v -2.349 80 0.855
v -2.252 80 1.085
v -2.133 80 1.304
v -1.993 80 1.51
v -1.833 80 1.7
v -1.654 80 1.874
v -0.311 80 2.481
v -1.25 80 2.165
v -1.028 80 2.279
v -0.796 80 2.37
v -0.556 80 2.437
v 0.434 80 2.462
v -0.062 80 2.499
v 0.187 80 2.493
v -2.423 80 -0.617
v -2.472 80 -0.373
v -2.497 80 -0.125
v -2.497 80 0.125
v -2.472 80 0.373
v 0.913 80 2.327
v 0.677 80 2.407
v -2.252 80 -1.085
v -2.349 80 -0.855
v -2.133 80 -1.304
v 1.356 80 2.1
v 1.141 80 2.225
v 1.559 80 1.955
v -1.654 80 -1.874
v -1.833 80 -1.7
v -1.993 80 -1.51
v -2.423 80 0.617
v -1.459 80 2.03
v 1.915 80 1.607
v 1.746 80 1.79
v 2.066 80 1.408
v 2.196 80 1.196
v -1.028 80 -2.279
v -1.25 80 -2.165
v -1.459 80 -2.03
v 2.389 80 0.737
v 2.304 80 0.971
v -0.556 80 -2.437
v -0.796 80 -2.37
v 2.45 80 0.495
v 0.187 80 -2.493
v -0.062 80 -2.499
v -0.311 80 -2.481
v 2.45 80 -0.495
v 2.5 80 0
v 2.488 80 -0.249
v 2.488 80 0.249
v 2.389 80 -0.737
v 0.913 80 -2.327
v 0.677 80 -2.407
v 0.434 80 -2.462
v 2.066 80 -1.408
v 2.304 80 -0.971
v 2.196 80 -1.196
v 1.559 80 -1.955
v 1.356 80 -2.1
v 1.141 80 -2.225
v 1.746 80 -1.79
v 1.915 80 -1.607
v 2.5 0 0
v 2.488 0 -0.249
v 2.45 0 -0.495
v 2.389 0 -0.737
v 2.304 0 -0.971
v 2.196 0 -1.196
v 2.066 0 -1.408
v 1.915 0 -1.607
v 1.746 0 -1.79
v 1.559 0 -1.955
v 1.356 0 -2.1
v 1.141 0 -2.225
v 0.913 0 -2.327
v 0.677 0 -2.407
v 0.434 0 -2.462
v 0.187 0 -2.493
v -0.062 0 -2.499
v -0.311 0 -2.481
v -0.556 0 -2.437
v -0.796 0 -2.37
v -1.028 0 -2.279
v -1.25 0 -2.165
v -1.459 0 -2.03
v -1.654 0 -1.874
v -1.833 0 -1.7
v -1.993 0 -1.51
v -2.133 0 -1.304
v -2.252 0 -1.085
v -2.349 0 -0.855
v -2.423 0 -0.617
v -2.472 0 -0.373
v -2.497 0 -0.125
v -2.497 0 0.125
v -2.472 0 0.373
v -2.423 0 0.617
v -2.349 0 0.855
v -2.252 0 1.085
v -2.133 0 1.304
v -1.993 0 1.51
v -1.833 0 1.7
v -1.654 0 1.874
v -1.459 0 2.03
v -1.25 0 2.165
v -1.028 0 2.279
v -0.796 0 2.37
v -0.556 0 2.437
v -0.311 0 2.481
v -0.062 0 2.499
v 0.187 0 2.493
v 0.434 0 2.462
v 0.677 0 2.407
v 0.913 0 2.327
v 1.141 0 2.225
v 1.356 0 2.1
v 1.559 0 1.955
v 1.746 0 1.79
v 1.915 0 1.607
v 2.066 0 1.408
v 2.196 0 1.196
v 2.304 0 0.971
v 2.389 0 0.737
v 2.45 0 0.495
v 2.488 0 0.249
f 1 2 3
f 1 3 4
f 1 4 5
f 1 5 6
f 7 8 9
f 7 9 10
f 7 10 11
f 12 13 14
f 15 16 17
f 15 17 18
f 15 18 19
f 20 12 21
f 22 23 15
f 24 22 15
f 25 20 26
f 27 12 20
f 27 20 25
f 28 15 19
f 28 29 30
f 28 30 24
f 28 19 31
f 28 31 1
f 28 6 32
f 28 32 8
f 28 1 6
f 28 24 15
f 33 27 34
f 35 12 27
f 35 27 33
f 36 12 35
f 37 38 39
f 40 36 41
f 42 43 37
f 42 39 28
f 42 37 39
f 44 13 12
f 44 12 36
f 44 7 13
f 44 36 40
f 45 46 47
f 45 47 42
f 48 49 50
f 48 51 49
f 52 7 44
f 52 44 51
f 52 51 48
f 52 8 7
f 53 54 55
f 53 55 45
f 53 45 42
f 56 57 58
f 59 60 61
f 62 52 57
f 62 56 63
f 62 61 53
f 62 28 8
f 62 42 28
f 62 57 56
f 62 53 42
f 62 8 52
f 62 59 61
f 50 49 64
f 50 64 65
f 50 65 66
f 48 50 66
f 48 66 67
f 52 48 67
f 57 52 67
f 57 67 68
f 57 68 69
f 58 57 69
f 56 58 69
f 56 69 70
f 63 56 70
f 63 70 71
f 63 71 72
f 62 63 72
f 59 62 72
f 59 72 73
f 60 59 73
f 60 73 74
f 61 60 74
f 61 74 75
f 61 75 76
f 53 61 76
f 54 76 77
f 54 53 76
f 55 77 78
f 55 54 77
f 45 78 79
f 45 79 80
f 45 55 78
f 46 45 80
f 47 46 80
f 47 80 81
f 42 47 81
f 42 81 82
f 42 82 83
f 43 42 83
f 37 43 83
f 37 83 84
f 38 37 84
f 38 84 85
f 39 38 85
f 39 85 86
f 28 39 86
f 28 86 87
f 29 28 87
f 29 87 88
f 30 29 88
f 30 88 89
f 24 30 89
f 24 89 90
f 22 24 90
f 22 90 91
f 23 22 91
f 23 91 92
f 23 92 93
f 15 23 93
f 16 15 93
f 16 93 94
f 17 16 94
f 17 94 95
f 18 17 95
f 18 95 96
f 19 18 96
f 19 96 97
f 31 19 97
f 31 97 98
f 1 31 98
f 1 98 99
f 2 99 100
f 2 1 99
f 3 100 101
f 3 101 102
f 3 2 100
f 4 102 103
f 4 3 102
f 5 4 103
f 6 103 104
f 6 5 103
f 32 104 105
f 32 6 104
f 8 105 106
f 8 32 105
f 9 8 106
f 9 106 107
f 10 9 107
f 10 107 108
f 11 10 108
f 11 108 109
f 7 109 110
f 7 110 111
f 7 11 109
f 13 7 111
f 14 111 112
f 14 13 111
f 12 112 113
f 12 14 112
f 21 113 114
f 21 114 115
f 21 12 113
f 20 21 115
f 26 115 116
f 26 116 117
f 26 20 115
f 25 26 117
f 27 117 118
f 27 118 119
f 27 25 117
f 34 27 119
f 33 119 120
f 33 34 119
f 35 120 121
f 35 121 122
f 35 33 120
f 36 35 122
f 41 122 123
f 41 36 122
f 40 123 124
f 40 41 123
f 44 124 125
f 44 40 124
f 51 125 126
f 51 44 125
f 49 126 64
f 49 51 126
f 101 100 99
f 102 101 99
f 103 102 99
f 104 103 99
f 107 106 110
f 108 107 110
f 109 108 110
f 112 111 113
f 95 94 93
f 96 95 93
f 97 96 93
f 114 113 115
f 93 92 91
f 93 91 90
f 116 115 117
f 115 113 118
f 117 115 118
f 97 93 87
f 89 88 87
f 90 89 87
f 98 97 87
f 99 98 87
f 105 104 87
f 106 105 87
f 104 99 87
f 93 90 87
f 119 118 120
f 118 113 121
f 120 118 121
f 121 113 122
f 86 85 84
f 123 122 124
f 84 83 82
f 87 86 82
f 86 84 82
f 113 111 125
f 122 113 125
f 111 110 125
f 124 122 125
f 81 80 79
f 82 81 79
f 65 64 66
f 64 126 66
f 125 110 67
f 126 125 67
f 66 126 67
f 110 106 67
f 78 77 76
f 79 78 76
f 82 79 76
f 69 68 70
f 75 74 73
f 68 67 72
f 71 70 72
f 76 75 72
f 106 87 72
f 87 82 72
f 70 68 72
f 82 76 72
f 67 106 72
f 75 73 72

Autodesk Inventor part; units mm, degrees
ref_plane "YZ Plane" through (0, 0, 0) normal (1, 0, 0) x (0, 1, 0)
ref_plane "XZ Plane" through (0, 0, 0) normal (0, 1, 0) x (-1, 0, 0)
ref_plane "XY Plane" through (0, 0, 0) normal (0, 0, 1) x (1, 0, 0)
sketch "Sketch1" plane through (0, 0, 0) normal (0, 1, 0) x (-1, 0, 0)
  circle A0 centre (0, 0) radius 5
  dimension "d0" = 10
extrude "Extrusion1" add sketch "Sketch1" along normal blind 80
sketch "Sketch2" plane through (0, 0, 0) normal (0, 0, 1) x (1, 0, 0)
  circle A0 centre (0, 20) radius 1
  point P0 (0, 0)
  dimension "d3" = 2
extrude "Extrusion2" add sketch "Sketch2" against normal mid plane 10
sketch "Sketch3" plane through (0, 80, 0) normal (0, 1, 0) x (1, 0, 0)
  circle A0 centre (0, 0) radius 2.5
  dimension "d6" = 5
extrude "Extrusion3" cut sketch "Sketch3" against normal through all keep common part
